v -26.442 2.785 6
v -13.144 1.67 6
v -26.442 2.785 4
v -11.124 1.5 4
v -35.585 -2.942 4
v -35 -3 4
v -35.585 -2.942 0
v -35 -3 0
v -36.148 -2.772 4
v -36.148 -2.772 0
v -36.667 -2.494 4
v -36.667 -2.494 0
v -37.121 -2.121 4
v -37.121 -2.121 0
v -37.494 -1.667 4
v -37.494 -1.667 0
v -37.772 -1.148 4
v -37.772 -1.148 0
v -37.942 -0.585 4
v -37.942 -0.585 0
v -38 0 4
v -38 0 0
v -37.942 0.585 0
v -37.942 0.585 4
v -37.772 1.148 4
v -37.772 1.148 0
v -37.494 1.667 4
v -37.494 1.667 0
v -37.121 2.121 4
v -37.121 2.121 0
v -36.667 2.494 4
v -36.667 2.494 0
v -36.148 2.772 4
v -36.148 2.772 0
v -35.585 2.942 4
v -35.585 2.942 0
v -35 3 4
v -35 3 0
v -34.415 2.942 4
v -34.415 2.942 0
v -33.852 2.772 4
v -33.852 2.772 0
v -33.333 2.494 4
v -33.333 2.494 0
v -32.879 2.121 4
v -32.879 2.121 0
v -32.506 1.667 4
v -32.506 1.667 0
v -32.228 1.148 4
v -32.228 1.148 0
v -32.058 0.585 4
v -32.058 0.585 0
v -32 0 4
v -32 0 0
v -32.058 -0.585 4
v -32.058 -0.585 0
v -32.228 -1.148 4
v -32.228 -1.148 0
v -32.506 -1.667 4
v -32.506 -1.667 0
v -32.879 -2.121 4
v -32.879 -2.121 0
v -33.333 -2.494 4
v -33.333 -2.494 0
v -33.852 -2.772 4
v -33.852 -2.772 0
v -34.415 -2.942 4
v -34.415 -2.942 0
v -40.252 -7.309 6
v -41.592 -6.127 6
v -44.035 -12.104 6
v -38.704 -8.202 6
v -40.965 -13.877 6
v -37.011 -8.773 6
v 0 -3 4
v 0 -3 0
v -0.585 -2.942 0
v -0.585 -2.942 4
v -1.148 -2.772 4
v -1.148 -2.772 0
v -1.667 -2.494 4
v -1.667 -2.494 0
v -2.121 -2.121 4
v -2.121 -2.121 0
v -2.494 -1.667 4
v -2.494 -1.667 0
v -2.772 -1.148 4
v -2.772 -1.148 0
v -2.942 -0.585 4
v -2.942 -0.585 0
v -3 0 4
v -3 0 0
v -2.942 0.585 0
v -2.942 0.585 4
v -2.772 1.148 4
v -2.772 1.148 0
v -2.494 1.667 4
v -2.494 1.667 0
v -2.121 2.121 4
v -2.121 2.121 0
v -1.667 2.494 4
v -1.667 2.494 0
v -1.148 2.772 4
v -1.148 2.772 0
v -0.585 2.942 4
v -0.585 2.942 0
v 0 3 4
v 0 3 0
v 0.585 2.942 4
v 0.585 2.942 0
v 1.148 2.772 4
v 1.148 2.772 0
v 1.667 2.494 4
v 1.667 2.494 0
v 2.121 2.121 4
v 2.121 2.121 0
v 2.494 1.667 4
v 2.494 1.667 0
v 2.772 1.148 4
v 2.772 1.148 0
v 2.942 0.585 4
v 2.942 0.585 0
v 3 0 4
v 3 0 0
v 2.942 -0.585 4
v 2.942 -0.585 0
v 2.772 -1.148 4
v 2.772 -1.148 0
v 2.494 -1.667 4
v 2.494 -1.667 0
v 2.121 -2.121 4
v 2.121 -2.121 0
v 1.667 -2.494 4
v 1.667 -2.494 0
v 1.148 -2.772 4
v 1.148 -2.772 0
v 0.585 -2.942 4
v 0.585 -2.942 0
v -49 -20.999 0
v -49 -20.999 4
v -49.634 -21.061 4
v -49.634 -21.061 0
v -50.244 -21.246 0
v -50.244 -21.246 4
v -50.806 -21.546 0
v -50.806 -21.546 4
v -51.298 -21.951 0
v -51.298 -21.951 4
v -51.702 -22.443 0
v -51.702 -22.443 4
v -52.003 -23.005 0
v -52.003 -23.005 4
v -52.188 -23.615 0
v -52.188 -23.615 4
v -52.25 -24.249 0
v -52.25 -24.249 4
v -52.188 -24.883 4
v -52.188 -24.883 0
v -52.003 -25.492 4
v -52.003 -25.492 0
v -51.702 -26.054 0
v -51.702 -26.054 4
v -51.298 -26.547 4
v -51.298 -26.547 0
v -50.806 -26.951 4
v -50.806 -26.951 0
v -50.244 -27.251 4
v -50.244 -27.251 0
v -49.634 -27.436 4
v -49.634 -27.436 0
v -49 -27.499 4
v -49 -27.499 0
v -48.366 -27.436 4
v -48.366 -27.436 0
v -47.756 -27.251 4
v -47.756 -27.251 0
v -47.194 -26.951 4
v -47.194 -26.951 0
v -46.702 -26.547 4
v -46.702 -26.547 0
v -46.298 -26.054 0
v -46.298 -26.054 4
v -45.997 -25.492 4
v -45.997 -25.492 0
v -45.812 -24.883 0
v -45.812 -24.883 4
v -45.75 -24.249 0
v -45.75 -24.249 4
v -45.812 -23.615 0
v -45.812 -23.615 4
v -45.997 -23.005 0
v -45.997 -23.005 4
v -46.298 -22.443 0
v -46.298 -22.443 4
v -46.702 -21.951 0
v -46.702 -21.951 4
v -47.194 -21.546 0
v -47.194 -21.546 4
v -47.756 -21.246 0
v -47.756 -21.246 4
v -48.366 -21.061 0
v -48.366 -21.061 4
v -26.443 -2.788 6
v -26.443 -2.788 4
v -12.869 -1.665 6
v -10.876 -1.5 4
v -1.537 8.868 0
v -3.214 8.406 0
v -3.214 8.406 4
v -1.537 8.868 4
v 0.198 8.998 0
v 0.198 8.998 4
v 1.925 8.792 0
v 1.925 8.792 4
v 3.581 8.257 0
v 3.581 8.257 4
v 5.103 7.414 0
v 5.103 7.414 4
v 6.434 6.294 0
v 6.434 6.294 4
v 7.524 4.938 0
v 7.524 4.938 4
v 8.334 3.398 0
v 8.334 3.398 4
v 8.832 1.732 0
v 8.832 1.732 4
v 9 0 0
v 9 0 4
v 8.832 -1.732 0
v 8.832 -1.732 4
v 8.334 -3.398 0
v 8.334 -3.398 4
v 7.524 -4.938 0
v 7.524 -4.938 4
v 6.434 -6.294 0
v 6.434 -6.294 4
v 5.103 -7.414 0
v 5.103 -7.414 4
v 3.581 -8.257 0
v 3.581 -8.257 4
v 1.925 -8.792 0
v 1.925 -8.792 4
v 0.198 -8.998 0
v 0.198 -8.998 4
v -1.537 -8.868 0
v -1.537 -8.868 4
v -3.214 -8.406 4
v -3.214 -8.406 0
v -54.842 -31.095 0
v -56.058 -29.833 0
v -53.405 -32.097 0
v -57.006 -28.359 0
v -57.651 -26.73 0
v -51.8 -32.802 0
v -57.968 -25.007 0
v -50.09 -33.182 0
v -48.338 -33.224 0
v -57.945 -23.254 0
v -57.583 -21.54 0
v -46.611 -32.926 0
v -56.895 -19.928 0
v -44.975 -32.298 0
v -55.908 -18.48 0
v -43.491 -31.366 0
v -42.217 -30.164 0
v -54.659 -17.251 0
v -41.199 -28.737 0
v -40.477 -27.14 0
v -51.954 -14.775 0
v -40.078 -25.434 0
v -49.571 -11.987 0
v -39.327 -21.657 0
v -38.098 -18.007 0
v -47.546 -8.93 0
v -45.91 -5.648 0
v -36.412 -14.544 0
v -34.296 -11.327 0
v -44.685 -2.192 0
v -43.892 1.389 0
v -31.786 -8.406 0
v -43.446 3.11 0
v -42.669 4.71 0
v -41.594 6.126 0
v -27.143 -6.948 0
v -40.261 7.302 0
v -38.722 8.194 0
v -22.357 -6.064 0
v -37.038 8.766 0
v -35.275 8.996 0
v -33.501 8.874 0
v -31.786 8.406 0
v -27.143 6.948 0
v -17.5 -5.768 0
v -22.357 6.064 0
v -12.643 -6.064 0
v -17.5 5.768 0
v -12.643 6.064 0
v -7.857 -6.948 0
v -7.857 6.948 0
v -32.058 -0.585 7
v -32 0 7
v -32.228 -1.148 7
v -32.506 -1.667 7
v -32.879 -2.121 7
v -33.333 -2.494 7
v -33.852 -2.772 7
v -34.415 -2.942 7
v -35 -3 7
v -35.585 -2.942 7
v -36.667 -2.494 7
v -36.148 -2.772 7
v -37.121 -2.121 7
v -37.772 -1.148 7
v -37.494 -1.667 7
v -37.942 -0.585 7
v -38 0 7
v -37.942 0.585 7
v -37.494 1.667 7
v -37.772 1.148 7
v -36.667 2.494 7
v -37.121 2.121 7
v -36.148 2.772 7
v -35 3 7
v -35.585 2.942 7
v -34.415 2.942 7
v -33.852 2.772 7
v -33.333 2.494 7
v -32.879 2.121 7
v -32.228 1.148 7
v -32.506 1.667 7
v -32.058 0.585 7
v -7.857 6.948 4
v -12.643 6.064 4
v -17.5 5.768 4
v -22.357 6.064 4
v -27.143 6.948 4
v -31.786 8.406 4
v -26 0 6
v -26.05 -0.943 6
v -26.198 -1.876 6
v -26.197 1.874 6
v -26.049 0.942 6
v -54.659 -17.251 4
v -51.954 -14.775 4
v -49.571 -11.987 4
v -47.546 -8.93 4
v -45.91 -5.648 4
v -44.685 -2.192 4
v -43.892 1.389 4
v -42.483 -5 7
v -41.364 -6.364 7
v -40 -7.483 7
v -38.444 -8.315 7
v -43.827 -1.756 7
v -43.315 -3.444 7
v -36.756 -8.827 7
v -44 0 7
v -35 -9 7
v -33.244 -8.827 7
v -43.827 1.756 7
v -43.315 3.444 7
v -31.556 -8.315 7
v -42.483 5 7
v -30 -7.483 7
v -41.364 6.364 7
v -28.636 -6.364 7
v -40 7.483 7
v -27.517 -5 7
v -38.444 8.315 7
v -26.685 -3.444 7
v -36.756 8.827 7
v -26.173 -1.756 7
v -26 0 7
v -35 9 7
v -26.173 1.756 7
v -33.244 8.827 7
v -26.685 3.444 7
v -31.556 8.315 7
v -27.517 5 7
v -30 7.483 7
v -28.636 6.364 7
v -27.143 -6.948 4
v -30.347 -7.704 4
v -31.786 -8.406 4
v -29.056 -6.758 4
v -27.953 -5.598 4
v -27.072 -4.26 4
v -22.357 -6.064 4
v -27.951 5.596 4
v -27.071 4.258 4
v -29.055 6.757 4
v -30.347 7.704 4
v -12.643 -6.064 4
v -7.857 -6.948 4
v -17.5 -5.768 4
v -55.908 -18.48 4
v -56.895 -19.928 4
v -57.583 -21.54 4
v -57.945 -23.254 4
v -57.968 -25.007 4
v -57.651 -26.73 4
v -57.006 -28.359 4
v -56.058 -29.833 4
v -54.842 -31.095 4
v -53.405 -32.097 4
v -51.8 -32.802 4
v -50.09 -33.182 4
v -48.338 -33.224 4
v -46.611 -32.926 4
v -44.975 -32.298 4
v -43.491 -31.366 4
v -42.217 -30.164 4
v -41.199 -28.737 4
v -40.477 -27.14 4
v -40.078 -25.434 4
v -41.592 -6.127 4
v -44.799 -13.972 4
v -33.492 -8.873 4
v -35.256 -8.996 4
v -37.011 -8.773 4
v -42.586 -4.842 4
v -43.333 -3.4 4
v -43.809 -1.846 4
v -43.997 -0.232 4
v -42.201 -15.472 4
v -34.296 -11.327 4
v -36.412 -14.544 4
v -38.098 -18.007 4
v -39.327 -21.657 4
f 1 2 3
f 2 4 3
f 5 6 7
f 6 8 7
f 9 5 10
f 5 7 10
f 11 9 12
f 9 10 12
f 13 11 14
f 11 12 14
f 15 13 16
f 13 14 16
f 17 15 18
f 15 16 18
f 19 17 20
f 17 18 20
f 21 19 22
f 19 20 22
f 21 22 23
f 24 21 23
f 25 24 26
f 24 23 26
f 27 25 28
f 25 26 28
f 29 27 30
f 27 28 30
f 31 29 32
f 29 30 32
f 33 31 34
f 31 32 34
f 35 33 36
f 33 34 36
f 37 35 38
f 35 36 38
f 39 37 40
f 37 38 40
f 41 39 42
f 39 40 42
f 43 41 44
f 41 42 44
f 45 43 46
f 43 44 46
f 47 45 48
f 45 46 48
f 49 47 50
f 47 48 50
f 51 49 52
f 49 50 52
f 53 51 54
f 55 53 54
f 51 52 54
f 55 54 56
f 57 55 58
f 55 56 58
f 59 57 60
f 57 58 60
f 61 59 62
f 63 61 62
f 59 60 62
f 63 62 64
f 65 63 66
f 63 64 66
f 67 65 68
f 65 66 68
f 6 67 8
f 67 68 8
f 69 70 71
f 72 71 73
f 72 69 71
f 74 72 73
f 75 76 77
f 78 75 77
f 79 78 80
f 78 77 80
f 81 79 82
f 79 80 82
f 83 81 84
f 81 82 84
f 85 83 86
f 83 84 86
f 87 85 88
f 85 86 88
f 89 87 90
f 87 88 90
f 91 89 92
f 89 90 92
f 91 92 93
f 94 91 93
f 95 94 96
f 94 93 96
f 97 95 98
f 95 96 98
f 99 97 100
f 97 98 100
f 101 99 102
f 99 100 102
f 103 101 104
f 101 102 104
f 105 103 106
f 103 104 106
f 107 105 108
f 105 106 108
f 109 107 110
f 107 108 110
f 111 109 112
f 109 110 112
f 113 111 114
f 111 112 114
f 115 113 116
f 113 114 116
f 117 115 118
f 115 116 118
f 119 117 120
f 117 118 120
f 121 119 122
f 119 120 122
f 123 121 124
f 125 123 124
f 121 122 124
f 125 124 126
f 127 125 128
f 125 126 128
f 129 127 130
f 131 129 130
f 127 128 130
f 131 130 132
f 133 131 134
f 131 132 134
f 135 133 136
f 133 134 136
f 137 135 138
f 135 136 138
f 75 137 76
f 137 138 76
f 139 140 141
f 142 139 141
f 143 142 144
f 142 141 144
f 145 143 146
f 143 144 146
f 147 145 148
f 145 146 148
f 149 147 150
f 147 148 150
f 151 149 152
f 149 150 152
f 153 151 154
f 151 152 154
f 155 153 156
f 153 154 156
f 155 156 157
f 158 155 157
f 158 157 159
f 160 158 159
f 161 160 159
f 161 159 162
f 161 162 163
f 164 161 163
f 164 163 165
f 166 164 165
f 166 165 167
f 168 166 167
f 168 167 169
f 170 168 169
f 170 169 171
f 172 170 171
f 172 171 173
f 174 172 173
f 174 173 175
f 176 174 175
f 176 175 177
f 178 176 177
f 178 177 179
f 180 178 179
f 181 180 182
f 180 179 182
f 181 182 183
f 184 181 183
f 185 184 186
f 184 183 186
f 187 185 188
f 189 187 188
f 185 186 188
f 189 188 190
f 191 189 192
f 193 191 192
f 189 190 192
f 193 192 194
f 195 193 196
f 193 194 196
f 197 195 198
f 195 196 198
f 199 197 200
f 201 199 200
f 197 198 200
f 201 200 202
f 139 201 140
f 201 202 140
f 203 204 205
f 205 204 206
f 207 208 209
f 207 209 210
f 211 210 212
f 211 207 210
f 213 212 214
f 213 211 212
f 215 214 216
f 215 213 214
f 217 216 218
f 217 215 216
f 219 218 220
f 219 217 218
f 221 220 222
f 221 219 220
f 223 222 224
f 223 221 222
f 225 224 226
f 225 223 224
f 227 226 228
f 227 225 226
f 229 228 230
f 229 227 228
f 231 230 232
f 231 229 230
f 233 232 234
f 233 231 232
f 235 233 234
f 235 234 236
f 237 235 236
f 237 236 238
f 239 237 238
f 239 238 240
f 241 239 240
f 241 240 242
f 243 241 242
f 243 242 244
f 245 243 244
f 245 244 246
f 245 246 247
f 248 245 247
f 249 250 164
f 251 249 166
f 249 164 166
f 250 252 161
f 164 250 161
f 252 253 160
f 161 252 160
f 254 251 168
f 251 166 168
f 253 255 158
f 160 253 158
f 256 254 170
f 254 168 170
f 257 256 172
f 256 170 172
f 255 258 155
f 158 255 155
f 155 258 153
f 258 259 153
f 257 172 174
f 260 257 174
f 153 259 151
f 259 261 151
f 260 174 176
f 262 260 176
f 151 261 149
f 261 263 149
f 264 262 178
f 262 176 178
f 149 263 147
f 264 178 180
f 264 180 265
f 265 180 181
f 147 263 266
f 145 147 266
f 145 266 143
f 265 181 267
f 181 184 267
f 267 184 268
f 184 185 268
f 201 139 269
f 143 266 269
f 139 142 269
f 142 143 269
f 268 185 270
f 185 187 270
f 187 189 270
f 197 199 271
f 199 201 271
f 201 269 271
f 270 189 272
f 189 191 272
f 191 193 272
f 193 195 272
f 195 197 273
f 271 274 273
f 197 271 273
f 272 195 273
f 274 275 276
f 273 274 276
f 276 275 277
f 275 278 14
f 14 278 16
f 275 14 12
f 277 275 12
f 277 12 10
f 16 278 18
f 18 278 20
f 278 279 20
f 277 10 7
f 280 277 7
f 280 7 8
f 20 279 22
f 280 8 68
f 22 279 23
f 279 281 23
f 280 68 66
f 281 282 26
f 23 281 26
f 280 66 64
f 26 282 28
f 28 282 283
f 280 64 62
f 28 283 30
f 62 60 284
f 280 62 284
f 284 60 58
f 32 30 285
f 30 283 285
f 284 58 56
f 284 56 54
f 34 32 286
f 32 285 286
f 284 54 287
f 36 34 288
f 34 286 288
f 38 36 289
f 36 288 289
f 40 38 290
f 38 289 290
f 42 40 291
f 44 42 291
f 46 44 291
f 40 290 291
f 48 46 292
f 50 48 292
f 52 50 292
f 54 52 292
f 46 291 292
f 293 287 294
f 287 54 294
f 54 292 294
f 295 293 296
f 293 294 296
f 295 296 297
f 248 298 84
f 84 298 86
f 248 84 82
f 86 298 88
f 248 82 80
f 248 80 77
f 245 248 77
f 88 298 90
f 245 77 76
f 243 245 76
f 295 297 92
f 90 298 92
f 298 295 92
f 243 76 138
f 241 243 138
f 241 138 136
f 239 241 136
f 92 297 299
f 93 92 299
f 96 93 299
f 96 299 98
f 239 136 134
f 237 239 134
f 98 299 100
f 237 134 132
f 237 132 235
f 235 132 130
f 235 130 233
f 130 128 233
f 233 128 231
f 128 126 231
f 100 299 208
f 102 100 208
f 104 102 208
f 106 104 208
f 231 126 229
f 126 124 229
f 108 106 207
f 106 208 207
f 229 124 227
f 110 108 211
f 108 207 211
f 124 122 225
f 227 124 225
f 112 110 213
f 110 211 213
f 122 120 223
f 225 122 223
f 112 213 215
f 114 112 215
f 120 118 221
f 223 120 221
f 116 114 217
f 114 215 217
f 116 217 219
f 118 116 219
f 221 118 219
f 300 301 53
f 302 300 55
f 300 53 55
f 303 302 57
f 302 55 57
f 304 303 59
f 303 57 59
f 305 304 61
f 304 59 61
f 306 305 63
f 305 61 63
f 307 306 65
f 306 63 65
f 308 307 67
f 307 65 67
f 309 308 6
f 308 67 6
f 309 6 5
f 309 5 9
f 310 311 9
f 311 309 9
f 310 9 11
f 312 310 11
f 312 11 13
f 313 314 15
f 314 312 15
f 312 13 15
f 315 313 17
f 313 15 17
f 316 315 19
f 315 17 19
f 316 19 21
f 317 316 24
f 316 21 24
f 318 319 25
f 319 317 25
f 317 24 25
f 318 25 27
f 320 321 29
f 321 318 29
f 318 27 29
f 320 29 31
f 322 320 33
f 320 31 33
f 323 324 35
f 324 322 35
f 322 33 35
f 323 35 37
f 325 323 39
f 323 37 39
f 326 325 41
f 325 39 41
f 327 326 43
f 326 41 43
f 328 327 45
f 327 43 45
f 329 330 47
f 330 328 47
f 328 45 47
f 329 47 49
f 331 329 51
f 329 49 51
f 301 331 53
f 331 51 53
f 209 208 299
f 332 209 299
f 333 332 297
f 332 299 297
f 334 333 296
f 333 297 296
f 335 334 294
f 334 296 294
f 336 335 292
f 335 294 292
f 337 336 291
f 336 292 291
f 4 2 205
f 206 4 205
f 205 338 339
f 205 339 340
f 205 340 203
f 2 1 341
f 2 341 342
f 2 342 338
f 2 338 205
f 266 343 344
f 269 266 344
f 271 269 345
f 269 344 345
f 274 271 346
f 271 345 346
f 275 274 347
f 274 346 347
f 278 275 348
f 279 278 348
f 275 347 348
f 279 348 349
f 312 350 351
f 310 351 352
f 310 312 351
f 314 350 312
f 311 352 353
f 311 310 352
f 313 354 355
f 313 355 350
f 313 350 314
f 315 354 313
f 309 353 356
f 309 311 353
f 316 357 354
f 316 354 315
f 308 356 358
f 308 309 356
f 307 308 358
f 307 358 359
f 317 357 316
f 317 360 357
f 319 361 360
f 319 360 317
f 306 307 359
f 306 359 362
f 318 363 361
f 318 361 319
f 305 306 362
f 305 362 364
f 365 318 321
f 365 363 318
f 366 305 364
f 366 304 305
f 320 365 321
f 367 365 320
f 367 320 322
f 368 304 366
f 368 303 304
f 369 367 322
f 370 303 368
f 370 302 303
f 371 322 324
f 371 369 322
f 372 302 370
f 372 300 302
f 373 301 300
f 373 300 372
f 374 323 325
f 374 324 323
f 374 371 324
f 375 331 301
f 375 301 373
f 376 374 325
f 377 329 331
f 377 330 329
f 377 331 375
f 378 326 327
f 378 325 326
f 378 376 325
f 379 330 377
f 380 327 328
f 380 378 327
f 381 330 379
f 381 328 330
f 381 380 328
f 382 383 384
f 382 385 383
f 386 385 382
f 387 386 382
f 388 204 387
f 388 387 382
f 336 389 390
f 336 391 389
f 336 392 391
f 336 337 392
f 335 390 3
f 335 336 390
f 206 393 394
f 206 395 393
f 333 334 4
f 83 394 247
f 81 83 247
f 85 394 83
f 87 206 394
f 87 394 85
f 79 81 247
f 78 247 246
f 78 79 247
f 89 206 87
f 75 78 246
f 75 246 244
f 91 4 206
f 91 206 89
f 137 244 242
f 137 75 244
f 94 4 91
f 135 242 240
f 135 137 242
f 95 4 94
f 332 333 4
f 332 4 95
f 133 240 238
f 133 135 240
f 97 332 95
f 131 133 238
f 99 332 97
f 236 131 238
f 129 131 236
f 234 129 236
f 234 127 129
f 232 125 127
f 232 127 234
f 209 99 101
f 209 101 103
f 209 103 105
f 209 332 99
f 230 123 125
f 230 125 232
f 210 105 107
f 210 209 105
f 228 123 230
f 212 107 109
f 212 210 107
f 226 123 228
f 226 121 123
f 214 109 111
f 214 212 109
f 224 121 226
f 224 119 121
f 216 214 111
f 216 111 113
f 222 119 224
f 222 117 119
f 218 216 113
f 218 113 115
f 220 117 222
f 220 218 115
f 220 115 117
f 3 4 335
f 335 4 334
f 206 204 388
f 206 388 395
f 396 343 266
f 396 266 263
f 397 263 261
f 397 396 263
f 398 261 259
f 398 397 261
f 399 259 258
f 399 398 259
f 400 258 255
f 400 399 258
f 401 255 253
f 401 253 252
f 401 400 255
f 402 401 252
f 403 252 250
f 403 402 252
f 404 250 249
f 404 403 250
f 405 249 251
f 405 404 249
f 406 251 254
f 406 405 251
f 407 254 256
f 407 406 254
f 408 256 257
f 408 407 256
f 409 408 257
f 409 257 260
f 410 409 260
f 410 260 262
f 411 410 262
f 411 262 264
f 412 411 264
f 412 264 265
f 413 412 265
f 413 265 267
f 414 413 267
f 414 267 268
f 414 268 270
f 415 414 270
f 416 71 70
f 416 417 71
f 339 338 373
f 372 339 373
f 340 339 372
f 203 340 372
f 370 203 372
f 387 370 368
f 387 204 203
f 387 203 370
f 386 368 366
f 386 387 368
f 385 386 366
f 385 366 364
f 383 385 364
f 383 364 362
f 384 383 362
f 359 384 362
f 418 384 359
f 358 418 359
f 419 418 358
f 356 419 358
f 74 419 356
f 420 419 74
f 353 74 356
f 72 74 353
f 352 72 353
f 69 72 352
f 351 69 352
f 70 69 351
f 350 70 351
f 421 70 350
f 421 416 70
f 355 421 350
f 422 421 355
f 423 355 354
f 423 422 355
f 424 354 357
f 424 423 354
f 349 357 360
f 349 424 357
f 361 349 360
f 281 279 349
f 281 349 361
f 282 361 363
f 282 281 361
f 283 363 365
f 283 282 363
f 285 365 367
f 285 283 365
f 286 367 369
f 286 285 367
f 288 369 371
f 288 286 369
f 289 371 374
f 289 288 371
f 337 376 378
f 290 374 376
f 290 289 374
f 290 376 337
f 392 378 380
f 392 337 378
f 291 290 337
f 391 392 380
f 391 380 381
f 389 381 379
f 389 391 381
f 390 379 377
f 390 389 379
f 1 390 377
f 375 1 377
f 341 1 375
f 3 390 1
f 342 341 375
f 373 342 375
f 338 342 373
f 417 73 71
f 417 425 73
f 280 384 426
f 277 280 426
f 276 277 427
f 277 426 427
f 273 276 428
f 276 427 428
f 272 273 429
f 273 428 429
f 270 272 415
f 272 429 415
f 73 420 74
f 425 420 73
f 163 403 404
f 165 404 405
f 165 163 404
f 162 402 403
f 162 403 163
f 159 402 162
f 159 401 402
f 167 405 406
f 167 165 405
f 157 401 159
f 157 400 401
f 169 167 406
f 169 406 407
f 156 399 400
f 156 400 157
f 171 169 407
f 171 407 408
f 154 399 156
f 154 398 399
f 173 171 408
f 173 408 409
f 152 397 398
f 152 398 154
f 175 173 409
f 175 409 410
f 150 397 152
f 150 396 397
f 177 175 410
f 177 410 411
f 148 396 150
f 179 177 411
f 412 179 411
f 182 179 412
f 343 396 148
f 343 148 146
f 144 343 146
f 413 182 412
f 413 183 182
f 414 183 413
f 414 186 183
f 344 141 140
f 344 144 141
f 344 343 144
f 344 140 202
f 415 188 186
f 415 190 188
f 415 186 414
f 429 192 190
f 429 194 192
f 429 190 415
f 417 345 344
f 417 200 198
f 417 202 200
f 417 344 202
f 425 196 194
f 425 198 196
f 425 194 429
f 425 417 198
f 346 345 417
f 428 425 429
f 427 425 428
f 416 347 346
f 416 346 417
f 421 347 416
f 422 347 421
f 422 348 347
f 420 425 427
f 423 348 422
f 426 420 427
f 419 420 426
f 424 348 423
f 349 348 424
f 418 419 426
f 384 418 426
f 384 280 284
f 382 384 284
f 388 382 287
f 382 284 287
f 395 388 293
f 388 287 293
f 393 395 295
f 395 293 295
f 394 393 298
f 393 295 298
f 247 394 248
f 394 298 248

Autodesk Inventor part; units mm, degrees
ref_plane "YZ Plane" through (0, 0, 0) normal (1, 0, 0) x (0, 1, 0)
ref_plane "XZ Plane" through (0, 0, 0) normal (0, 1, 0) x (-1, 0, 0)
ref_plane "XY Plane" through (0, 0, 0) normal (0, 0, 1) x (1, 0, 0)
sketch "Base" plane through (0, 0, 0) normal (0, 0, 1) x (1, 0, 0)
  line L0 (-54.6, 0) -> (19.6, 0) construction
  circle A0 centre (0, 0) radius 9
  line L1 (0, 0) -> (-35, 0) construction
  circle A1 centre (-35, 0) radius 9
  arc A2 (-31.7857, 8.4064) -> (-3.2143, 8.4064) centre (-17.5, 45.7684) ccw
  arc A3 (-3.2143, -8.4064) -> (-31.7857, -8.4064) centre (-17.5, -45.7684) ccw
  dimension "d0" = 18
  dimension "d1" = 35
  dimension "d2" = 18
  dimension "d3" = 40
extrude "BaseFeature" add sketch "Base" along normal blind 4
sketch "Sketch2" plane through (0, 0, 4) normal (0, 0, 1) x (1, 0, 0)
  arc A0 (-31.7857, 8.4064) -> (-31.7857, -8.4064) centre (-35, 0) ccw projected
  arc A1 (-3.2143, -8.4064) -> (-3.2143, 8.4064) centre (0, 0) ccw projected
hole "BaseHolesFeature" at (-35, 0, 4) at (0, 0, 4) direction (0, 0, -1) diameter 6 end through all
sketch "Extension" plane through (0, 0, 4) normal (0, 0, 1) x (1, 0, 0)
  arc A0 (-31.7857, 8.4064) -> (-31.7857, -8.4064) centre (-35, 0) ccw construction
  line L0 (-35, 0) -> (-49, -24.2487) construction
  line L1 (-90.0286, 0) -> (25.5048, 0) construction
  circle A1 centre (-49, -24.2487) radius 9
  arc A2 (-54.6593, -17.2507) -> (-43.8901, 1.4021) centre (-73.5238, 6.0759) ccw
  arc A3 (-31.7857, -8.4064) -> (-40.0784, -25.4338) centre (-10.3396, -29.3841) ccw
  arc A4 (-43.8901, 1.4021) -> (-31.7857, -8.4064) centre (-35, 0) ccw
  dimension "d13" = 120
  dimension "d14" = 28
  dimension "d24" = 18
  dimension "d29" = 30
extrude "ExtensionFeature" add sketch "Extension" against normal up to surface (4 mm away)
sketch "ExtensionHole" plane through (0, 0, 0) normal (0, 0, -1) x (-1, 0, 0)
  arc A0 (40.0784, -25.4338) -> (54.6593, -17.2507) centre (49, -24.2487) ccw projected
hole "ExtensionHoleFeature" at (-49, -24.2487, 0) direction (0, 0, 1) diameter 6.5 end through all
sketch "MiddleRaise" plane through (0, 0, 4) normal (0, 0, 1) x (1, 0, 0)
  circle A0 centre (-35, 0) radius 3 projected
  circle A1 centre (-35, 0) radius 9
  point P0 (-31.7857, 8.4064)
extrude "MiddleRaiseFeature" add sketch "MiddleRaise" along normal blind 3
sketch "TopRidges" plane through (0, 0, 4) normal (0, 0, 1) x (1, 0, 0)
  arc A0 (-54.6593, -17.2507) -> (-40.0784, -25.4338) centre (-49, -24.2487) ccw construction
  arc A1 (-3.2143, -8.4064) -> (-3.2143, 8.4064) centre (0, 0) ccw construction
  arc A2 (-43.8901, 1.4021) -> (-31.7857, -8.4064) centre (-35, 0) ccw construction
  arc A3 (-31.7857, -8.4064) -> (-31.7857, 8.4064) centre (-35, 0) ccw construction
  line L0 (-35, 0) -> (-49, -24.2487) construction
  line L1 (-40.5981, -3.6962) -> (-35.4019, -6.6962)
  line L2 (-35.4019, -6.6962) -> (-42.201, -15.4724)
  line L3 (-42.201, -15.4724) -> (-44.799, -13.9724)
  line L4 (-44.799, -13.9724) -> (-40.5981, -3.6962)
  arc A4 (-40.0784, -25.4338) -> (-54.6593, -17.2507) centre (-49, -24.2487) ccw construction
  line L5 (-35, 0) -> (-11, 0) construction
  arc A5 (-3.2143, 8.4064) -> (-3.2143, -8.4064) centre (0, 0) ccw construction
  line L6 (-29, 3) -> (-29, -3)
  line L7 (-29, -3) -> (-10.8759, -1.5)
  line L8 (-10.8759, -1.5) -> (-11.1241, 1.5)
  line L9 (-11.1241, 1.5) -> (-29, 3)
  point P0 (-43.5, -14.7224)
  point P1 (-38, -5.1962)
  point P2 (-29, 0)
  dimension "d30" = 3
  dimension "d31" = 6
  dimension "d37" = 6
  dimension "d39" = 11
  dimension "d40" = 11
  dimension "d41" = 6
  dimension "d42" = 6
  dimension "d43" = 3
extrude "TopRidgesFeature" add sketch "TopRidges" along normal blind 2
chamfer "TopRidgeChamfersFeature" distance 2 angle 45 2 edges at (-43.5, -14.7224, 6) (-11, 0, 6)
equation "\"d41\" = d37"
equation "\"d42\" = d31"
equation "\"d43\" = d30"
properties part number "ShoulderSubConnector"
